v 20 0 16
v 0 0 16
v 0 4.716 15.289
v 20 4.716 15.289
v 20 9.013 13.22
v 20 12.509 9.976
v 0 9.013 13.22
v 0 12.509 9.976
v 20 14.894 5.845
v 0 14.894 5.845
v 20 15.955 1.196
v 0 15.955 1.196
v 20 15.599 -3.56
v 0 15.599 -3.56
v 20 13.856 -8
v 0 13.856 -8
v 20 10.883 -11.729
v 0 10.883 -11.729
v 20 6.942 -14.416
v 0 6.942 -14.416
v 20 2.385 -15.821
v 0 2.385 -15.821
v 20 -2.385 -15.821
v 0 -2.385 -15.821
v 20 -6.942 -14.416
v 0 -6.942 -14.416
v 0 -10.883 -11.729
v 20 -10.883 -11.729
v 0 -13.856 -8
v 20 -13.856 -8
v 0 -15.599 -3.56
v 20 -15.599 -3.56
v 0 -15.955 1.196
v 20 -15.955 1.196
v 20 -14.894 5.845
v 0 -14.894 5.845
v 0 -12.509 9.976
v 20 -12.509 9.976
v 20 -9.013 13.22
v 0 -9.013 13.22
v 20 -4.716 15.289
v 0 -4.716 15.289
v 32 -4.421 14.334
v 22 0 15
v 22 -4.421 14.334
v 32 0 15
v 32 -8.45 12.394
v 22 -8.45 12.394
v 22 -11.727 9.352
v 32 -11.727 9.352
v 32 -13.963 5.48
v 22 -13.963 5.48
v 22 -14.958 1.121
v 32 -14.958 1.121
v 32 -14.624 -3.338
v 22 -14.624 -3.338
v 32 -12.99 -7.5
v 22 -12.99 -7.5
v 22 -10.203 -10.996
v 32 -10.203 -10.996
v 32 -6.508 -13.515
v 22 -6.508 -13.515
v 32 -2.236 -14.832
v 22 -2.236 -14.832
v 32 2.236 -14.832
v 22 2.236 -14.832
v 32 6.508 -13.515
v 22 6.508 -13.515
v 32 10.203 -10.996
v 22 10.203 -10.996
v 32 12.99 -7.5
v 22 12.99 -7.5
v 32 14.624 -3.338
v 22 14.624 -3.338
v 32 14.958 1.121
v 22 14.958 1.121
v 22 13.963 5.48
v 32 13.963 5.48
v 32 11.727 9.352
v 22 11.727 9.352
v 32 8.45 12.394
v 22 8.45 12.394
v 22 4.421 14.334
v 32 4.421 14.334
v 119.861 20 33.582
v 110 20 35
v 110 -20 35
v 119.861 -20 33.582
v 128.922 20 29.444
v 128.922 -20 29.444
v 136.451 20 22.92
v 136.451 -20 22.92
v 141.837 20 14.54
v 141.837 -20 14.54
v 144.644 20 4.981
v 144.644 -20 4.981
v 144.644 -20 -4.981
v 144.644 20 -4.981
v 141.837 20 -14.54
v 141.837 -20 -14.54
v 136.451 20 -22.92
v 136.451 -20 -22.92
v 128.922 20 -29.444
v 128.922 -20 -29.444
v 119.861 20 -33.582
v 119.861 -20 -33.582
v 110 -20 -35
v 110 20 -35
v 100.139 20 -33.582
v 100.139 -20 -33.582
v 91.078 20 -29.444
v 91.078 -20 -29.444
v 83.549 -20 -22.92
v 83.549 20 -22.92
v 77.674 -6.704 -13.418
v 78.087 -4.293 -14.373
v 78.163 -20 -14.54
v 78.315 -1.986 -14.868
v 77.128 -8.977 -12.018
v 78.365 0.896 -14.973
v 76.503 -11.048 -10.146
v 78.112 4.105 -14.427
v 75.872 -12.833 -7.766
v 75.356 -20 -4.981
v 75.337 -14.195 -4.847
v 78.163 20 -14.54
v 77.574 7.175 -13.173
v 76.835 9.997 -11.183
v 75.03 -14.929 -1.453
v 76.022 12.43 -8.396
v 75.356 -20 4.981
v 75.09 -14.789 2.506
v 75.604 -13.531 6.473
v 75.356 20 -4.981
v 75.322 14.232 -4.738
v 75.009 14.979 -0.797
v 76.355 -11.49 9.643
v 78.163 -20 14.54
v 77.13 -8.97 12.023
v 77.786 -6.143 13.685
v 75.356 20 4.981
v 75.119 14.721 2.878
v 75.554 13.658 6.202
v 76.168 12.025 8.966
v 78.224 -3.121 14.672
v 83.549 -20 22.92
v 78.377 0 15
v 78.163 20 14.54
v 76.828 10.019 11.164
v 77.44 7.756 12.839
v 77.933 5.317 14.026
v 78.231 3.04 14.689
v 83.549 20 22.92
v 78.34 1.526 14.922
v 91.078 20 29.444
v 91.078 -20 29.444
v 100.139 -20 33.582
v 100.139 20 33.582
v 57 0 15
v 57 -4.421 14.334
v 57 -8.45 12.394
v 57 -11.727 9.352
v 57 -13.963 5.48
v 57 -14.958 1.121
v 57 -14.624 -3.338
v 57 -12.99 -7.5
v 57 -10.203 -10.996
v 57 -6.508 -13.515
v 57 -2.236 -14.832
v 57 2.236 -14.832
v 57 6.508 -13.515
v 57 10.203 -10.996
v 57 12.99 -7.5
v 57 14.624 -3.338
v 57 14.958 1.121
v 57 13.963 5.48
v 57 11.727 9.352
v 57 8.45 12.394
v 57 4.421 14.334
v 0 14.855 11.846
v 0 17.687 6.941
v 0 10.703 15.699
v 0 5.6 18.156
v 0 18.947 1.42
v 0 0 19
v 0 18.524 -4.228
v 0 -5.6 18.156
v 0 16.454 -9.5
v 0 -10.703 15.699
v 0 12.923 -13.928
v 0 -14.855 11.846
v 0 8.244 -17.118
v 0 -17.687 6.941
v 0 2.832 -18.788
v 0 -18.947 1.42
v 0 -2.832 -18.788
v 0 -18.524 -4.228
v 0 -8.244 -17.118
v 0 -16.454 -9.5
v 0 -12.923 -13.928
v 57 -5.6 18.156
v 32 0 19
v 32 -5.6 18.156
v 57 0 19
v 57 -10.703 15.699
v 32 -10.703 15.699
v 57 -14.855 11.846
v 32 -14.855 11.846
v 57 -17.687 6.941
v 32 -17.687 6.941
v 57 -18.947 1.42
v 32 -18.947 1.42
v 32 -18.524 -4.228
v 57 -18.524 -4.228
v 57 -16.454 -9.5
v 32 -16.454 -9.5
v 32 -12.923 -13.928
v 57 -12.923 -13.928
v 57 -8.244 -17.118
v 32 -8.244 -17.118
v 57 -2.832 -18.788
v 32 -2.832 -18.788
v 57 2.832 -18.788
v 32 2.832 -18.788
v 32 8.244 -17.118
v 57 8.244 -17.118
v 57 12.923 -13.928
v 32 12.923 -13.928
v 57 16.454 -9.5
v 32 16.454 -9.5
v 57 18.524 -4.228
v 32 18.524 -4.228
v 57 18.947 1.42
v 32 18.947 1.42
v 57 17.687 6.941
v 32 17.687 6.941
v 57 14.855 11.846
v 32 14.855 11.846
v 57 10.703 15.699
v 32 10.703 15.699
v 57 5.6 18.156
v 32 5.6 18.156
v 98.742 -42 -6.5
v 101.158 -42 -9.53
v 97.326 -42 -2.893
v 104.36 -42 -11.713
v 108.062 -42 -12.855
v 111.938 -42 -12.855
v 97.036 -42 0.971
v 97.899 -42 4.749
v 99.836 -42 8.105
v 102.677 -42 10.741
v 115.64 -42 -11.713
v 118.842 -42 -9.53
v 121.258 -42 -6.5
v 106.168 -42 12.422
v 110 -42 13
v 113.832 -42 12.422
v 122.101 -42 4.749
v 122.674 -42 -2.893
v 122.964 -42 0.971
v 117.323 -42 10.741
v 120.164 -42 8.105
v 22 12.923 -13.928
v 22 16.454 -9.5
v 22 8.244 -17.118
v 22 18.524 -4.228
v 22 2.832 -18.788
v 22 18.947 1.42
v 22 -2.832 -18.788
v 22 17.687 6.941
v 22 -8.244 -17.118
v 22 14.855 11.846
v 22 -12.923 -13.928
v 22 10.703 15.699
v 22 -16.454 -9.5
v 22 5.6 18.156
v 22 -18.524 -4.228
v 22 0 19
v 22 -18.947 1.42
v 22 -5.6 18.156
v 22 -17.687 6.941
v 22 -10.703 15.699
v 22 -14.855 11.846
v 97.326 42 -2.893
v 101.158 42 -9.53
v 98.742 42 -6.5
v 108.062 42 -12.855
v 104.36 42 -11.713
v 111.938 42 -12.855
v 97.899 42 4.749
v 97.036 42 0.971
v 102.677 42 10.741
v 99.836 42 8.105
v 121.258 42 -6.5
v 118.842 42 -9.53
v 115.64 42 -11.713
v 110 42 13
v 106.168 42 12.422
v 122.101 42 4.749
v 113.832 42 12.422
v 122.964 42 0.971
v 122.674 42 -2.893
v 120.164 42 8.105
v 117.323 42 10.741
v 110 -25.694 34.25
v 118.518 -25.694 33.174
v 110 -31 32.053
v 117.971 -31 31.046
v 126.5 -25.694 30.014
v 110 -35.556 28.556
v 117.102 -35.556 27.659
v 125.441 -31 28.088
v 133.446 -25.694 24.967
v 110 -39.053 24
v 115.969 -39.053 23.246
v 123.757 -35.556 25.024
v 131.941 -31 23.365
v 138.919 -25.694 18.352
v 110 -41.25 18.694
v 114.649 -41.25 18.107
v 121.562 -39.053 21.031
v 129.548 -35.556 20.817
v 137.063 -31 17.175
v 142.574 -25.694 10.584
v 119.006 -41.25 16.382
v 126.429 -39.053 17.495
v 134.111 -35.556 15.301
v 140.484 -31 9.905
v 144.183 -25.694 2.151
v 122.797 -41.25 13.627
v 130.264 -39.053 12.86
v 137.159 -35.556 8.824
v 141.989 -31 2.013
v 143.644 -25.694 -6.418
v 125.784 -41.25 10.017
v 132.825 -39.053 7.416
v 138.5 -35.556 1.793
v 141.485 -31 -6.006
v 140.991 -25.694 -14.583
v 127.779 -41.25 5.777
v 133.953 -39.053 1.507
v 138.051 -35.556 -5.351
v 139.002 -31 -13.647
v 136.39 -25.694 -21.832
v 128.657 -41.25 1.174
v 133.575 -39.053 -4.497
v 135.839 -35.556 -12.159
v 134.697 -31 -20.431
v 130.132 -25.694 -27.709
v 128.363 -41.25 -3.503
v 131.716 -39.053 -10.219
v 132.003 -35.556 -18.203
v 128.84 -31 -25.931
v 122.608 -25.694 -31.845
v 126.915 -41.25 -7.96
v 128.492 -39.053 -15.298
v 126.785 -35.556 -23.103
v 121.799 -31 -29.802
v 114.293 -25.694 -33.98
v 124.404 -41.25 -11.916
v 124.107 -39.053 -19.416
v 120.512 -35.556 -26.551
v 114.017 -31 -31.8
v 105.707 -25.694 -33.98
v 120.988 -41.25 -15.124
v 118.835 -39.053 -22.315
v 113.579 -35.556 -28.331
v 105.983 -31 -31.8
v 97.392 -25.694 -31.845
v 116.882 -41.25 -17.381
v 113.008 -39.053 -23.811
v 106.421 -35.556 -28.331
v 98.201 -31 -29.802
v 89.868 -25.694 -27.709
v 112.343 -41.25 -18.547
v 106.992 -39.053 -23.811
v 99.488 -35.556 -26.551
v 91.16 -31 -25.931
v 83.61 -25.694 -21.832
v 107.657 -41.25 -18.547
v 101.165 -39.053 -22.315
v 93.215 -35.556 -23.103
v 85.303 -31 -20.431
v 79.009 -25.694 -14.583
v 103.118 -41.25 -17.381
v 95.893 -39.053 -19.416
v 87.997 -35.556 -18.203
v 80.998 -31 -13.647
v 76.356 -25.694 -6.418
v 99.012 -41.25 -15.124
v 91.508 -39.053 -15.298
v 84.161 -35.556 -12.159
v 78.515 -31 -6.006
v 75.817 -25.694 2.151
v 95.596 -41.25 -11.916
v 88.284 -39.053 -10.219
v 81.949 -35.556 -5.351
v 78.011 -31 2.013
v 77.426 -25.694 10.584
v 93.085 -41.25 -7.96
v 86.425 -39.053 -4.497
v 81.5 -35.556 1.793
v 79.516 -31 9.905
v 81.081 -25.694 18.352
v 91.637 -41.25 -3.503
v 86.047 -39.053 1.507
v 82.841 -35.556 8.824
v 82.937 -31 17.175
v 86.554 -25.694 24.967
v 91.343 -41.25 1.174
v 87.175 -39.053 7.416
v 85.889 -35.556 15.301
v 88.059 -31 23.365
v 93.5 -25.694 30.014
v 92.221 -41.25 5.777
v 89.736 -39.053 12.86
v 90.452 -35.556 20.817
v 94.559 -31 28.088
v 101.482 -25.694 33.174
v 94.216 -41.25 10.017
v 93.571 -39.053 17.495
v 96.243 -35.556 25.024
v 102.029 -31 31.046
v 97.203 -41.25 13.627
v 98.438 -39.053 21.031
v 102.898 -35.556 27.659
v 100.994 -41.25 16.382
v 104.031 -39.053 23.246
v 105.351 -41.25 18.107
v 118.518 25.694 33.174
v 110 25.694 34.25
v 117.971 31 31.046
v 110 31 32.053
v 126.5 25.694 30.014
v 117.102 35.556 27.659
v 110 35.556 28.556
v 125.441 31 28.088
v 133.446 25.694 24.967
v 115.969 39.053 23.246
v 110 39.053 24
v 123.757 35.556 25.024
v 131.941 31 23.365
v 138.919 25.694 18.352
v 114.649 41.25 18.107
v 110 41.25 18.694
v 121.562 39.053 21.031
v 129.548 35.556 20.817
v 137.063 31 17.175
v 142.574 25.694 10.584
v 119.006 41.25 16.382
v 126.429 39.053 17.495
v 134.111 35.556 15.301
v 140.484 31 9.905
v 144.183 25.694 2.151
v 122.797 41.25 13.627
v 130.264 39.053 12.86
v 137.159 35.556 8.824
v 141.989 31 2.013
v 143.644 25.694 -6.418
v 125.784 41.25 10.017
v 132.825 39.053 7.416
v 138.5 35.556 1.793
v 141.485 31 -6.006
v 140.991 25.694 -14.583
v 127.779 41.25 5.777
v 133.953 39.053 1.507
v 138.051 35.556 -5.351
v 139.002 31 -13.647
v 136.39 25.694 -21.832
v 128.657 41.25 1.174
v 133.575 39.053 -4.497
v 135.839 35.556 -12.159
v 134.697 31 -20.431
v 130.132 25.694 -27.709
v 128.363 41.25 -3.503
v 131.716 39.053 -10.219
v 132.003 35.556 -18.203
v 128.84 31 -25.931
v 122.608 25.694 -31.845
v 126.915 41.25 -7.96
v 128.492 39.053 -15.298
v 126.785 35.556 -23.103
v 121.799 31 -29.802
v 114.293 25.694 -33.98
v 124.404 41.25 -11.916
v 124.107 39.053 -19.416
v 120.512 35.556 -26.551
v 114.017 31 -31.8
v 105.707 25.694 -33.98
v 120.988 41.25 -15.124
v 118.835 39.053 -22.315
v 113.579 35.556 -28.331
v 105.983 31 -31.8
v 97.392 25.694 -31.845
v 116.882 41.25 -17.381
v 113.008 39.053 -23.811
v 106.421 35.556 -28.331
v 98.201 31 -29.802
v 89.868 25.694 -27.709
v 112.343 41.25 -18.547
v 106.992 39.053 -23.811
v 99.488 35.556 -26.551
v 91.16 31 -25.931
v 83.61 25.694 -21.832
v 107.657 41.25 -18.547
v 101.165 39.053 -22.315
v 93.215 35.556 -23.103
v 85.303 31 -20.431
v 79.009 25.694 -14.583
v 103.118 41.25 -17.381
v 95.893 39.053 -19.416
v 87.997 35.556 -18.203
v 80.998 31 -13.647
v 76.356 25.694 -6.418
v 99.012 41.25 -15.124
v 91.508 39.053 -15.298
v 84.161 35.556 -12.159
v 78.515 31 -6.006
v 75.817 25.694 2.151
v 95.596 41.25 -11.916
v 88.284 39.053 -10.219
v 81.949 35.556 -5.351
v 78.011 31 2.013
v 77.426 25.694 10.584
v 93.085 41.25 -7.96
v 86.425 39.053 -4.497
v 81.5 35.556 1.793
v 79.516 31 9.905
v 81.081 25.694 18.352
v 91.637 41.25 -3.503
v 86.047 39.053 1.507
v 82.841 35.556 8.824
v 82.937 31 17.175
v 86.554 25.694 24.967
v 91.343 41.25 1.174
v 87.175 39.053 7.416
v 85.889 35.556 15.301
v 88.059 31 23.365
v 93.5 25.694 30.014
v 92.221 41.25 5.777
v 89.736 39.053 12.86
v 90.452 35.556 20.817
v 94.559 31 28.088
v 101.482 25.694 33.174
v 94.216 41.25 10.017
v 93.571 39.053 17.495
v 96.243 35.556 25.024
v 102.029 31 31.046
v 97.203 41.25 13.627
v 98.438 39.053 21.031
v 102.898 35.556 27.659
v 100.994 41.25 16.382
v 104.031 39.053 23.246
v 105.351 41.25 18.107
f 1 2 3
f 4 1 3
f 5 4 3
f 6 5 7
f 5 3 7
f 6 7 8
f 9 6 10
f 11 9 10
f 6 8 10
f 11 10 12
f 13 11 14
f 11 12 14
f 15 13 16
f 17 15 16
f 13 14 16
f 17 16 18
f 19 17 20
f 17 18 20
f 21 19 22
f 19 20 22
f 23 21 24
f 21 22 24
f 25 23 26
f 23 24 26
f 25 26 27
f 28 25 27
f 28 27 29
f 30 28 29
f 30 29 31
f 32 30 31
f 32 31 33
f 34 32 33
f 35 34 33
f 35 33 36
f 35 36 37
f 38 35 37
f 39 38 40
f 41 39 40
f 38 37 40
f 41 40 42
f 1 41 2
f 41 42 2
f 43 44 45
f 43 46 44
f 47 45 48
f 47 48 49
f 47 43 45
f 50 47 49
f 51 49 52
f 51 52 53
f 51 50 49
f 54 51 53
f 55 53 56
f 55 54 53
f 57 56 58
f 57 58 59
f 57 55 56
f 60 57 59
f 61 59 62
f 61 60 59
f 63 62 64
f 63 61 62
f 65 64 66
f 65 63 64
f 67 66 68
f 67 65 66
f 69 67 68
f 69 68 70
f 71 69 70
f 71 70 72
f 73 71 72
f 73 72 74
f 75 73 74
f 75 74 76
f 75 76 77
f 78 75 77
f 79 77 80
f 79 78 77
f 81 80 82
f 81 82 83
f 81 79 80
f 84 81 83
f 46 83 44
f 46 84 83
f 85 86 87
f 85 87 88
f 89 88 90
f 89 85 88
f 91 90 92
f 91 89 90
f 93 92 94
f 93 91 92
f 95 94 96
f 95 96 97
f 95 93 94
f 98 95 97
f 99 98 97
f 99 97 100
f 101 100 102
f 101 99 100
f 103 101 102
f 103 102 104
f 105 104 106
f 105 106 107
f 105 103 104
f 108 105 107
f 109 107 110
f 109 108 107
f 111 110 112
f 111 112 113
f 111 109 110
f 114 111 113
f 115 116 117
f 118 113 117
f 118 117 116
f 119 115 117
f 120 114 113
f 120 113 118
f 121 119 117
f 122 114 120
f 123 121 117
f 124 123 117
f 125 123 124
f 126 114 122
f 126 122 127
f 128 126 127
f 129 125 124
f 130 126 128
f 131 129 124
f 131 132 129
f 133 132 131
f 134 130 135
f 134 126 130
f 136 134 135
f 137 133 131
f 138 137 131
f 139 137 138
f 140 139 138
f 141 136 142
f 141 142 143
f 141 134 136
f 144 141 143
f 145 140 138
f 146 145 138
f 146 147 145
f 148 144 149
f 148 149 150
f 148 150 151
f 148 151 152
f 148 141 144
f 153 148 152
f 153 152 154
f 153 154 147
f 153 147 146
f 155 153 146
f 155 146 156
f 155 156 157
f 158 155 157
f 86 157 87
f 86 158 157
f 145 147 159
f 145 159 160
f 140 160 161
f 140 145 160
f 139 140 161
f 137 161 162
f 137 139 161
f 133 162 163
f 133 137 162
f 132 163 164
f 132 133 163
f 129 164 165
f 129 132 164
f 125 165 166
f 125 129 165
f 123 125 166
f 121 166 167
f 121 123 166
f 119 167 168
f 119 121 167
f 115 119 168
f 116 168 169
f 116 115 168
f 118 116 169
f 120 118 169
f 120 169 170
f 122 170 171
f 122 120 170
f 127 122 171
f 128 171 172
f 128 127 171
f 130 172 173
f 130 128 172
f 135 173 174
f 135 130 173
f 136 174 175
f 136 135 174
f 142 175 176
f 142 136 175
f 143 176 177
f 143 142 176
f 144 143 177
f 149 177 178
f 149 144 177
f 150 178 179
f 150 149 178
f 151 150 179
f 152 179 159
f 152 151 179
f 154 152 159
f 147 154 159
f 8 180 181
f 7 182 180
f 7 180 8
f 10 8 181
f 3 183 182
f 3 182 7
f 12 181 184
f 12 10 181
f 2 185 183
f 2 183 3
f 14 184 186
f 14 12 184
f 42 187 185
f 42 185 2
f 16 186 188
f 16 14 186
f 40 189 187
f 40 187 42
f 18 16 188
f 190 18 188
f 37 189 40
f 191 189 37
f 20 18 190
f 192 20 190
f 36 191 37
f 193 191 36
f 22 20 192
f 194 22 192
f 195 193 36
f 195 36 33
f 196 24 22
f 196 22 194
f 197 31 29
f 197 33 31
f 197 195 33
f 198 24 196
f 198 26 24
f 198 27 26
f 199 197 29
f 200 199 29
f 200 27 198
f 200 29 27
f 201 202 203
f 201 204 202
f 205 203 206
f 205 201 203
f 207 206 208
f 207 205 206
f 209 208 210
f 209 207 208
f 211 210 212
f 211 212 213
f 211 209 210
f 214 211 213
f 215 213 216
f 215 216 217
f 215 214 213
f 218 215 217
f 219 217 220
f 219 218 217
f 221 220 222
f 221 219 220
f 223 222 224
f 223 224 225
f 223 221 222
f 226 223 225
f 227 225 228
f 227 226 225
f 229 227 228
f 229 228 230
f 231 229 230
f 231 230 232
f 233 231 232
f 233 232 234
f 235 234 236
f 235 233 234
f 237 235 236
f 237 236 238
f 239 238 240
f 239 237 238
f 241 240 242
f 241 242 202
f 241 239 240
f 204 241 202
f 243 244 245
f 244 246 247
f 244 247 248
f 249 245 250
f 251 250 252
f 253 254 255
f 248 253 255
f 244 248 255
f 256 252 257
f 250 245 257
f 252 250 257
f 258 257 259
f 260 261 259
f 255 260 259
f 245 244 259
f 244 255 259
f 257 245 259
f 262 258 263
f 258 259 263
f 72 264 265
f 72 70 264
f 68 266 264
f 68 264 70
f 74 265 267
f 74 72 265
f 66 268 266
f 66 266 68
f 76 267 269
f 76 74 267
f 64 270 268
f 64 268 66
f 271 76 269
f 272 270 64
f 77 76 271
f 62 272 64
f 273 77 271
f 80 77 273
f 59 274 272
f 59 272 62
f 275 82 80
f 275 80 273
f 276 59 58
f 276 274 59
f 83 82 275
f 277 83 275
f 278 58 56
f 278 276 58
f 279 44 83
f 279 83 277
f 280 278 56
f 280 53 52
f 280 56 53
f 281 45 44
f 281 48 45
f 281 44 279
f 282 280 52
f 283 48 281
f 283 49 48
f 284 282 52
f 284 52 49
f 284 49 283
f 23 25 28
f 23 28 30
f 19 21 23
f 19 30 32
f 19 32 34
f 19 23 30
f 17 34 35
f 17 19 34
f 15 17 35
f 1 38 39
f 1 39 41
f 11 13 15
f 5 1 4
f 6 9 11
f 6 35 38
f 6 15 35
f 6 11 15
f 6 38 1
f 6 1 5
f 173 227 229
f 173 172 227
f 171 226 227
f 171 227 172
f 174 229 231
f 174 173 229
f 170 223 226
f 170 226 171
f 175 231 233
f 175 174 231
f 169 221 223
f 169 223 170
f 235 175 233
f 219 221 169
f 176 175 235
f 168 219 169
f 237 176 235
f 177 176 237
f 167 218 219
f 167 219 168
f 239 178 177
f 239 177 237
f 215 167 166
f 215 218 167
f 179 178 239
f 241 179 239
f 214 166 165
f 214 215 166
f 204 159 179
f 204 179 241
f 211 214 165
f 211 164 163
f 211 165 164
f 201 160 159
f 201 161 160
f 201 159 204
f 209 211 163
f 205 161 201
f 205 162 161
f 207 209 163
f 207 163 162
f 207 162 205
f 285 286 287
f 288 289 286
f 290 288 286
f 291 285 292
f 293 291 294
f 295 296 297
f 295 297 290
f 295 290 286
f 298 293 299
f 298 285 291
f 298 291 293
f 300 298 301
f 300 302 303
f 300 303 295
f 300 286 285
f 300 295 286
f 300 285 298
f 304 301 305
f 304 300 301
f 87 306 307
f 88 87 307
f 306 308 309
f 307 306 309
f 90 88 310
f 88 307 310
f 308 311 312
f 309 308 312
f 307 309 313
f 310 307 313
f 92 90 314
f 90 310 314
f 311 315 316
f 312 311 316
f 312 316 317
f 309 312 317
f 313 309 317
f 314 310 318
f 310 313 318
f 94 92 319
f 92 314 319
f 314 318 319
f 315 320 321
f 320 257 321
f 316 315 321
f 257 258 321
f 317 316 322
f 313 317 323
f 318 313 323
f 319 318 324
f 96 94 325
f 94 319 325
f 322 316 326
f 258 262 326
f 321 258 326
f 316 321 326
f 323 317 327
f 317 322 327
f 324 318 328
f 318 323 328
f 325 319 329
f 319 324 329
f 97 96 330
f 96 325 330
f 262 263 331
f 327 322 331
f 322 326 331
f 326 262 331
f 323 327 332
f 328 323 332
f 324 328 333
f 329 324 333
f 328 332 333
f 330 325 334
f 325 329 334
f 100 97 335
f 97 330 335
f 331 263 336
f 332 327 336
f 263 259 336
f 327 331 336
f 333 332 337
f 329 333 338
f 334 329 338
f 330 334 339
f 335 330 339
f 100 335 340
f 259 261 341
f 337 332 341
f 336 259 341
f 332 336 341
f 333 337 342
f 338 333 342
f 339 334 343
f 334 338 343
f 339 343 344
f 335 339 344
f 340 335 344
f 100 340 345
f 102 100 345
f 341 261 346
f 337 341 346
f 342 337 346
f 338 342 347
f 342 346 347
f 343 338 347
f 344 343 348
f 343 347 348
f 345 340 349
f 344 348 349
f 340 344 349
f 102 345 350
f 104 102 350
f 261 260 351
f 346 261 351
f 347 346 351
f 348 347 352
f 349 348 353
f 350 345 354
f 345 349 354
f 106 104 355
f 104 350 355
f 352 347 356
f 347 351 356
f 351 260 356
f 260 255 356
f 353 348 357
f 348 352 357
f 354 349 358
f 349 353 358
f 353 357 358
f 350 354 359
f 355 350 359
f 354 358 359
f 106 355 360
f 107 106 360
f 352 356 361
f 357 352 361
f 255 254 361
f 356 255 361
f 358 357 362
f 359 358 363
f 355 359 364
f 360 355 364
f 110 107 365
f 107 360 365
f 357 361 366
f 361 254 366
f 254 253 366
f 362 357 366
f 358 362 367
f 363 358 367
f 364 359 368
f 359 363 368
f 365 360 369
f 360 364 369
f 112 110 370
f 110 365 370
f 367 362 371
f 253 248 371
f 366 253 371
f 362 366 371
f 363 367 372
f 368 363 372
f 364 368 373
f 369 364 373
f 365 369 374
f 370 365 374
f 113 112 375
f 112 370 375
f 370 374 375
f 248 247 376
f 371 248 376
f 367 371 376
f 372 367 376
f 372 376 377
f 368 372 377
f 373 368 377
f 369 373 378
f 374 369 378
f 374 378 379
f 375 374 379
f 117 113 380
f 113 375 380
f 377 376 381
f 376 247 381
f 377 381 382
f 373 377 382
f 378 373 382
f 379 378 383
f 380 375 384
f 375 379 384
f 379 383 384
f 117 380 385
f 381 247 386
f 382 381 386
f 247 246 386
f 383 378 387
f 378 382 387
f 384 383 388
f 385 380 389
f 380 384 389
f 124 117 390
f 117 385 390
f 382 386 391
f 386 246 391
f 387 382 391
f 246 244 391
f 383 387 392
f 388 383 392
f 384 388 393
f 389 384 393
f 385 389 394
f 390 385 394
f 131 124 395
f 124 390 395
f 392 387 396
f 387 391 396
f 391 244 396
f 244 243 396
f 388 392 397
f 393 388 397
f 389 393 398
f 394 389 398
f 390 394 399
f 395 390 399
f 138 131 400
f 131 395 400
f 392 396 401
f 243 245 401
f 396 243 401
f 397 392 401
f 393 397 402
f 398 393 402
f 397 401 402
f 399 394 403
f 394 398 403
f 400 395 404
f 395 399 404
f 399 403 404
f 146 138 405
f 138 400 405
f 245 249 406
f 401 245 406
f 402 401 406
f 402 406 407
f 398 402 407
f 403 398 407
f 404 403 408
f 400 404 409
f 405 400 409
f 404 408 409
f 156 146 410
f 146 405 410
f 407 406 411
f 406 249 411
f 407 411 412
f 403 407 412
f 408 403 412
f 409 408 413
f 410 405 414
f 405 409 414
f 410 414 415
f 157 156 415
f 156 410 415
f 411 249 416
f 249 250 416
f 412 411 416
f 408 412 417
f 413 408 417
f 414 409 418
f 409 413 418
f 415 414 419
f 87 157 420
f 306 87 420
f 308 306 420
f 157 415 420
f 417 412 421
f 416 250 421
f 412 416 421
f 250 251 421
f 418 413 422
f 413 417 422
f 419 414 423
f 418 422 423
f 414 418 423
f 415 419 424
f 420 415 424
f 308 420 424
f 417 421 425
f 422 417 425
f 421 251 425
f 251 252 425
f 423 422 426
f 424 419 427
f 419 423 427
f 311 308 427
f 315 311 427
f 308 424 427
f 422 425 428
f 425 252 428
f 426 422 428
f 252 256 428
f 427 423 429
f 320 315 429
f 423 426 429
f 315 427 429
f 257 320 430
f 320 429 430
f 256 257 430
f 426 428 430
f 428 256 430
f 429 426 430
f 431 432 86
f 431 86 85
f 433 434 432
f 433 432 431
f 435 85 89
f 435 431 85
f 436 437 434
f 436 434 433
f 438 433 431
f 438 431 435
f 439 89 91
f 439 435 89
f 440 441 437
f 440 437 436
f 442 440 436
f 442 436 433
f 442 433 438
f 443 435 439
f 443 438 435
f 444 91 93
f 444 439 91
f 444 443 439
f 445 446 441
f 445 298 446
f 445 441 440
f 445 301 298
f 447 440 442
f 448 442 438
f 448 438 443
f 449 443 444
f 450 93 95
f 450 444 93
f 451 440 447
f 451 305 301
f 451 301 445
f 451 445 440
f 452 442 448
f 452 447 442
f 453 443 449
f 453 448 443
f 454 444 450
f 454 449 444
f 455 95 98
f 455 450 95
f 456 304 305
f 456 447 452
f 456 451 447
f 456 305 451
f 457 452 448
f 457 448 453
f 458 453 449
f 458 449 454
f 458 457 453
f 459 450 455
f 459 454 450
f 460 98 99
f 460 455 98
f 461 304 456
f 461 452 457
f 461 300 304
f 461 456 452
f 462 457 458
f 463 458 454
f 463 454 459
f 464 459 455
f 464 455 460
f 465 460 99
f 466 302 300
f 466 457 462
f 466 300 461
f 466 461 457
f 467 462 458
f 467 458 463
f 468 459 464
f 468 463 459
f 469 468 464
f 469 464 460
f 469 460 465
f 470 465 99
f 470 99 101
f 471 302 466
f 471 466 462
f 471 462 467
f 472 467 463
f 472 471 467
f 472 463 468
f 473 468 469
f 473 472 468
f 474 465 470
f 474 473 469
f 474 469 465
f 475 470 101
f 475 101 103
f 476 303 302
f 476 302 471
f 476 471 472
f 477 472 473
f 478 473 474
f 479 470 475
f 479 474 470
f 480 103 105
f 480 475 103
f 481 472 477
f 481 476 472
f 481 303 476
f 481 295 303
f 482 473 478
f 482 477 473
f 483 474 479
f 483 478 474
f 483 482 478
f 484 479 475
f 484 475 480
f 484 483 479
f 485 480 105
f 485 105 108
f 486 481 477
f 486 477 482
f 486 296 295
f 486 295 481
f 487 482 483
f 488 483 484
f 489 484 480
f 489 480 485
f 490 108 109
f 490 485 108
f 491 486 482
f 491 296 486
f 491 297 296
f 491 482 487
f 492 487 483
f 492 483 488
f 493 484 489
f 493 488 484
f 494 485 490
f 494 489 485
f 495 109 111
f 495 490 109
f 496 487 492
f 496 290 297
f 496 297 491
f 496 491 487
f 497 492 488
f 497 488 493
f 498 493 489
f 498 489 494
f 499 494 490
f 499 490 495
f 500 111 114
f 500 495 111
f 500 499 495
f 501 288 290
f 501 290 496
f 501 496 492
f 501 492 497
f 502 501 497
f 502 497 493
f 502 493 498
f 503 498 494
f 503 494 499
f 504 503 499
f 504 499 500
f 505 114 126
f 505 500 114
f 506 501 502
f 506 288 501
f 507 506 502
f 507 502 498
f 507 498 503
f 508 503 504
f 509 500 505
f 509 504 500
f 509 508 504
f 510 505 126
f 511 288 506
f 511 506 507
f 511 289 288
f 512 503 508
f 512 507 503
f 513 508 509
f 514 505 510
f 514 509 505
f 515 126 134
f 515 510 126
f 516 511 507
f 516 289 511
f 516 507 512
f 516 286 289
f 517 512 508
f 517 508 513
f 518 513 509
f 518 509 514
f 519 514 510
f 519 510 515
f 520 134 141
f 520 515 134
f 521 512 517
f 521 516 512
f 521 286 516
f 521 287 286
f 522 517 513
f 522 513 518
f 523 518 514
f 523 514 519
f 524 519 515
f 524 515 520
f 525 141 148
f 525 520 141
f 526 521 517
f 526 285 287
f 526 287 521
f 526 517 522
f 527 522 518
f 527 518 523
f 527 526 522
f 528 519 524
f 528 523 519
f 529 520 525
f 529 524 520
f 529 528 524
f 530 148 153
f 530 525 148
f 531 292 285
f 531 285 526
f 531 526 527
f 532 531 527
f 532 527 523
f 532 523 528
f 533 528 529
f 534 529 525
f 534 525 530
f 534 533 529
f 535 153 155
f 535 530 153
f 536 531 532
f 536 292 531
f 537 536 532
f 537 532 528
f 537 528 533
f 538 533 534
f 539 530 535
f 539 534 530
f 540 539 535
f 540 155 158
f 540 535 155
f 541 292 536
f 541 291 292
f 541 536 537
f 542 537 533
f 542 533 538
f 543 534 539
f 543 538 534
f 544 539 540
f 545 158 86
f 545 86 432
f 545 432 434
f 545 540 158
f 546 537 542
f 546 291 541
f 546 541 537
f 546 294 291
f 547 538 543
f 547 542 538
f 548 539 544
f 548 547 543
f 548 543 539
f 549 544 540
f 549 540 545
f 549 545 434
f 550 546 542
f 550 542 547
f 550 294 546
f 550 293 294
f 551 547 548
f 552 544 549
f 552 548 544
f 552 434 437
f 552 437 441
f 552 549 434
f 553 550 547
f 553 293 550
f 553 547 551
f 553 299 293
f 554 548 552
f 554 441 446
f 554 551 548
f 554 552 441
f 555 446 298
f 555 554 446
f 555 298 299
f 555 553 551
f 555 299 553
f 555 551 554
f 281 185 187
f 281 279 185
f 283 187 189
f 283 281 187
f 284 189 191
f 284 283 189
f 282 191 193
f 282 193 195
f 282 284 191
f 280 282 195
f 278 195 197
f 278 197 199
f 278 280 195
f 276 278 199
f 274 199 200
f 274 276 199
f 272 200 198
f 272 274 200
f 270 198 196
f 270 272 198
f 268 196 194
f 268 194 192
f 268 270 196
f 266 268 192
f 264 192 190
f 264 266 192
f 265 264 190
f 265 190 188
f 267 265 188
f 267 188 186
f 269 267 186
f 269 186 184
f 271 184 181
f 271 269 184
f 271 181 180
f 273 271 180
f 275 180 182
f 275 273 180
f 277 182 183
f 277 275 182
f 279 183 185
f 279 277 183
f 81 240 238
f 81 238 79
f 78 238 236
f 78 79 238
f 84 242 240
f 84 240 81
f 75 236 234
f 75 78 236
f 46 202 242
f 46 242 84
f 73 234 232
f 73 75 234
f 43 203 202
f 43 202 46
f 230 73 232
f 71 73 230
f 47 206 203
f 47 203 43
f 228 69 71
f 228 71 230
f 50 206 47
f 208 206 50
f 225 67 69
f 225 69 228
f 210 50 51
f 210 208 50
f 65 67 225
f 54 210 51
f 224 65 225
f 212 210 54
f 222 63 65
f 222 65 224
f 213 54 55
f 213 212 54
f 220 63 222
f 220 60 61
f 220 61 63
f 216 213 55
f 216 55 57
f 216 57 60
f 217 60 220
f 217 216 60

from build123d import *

# Parameters (mm, degrees)
SKETCH_2_R          = 35
EXTRUDE_1_DEPTH     = 42
FILLET_2_R          = 22
SKETCH_3_R          = 16
CUT_EXTRUDE_1_DEPTH = 20


with BuildPart() as part:
    # 草图1 → 旋转1 (revolve)
    with BuildSketch(Plane.XY, mode=Mode.PRIVATE) as revolve_1_sk:
        Polygon((0, 0), (0, 19), (22, 19), (22, 15), (32, 15), (32, 19), (57, 19), (57, 15), (112, 15), (112, 0), align=None)
    revolve(revolve_1_sk.sketch.rotate(Axis((0, 0, 0), (1, 0, 0)), 90), axis=Axis((0, 0, 0), (1, 0, 0)))

    # 草图2 → 凸台-拉伸1 (add, symmetric)
    with BuildSketch(Plane(origin=(0, 0, 0), x_dir=(1, 0, 0), z_dir=(0, 1, 0))):
        with Locations(Location((110, 0, 0), (0, 0, 270))):
            Circle(SKETCH_2_R)
    extrude(amount=EXTRUDE_1_DEPTH, both=True)

    # 圆角2
    fillet_2_edges = [part.edges().sort_by_distance(p)[0] for p in [
        (110, -42, -35),
        (110, 42, -35),
    ]]
    fillet(fillet_2_edges, radius=FILLET_2_R)

    # 草图3 → 切除-拉伸1 (cut)
    with BuildSketch(Plane.ZY):
        Circle(SKETCH_3_R)
    extrude(amount=-CUT_EXTRUDE_1_DEPTH, mode=Mode.SUBTRACT)


solid = part.part
